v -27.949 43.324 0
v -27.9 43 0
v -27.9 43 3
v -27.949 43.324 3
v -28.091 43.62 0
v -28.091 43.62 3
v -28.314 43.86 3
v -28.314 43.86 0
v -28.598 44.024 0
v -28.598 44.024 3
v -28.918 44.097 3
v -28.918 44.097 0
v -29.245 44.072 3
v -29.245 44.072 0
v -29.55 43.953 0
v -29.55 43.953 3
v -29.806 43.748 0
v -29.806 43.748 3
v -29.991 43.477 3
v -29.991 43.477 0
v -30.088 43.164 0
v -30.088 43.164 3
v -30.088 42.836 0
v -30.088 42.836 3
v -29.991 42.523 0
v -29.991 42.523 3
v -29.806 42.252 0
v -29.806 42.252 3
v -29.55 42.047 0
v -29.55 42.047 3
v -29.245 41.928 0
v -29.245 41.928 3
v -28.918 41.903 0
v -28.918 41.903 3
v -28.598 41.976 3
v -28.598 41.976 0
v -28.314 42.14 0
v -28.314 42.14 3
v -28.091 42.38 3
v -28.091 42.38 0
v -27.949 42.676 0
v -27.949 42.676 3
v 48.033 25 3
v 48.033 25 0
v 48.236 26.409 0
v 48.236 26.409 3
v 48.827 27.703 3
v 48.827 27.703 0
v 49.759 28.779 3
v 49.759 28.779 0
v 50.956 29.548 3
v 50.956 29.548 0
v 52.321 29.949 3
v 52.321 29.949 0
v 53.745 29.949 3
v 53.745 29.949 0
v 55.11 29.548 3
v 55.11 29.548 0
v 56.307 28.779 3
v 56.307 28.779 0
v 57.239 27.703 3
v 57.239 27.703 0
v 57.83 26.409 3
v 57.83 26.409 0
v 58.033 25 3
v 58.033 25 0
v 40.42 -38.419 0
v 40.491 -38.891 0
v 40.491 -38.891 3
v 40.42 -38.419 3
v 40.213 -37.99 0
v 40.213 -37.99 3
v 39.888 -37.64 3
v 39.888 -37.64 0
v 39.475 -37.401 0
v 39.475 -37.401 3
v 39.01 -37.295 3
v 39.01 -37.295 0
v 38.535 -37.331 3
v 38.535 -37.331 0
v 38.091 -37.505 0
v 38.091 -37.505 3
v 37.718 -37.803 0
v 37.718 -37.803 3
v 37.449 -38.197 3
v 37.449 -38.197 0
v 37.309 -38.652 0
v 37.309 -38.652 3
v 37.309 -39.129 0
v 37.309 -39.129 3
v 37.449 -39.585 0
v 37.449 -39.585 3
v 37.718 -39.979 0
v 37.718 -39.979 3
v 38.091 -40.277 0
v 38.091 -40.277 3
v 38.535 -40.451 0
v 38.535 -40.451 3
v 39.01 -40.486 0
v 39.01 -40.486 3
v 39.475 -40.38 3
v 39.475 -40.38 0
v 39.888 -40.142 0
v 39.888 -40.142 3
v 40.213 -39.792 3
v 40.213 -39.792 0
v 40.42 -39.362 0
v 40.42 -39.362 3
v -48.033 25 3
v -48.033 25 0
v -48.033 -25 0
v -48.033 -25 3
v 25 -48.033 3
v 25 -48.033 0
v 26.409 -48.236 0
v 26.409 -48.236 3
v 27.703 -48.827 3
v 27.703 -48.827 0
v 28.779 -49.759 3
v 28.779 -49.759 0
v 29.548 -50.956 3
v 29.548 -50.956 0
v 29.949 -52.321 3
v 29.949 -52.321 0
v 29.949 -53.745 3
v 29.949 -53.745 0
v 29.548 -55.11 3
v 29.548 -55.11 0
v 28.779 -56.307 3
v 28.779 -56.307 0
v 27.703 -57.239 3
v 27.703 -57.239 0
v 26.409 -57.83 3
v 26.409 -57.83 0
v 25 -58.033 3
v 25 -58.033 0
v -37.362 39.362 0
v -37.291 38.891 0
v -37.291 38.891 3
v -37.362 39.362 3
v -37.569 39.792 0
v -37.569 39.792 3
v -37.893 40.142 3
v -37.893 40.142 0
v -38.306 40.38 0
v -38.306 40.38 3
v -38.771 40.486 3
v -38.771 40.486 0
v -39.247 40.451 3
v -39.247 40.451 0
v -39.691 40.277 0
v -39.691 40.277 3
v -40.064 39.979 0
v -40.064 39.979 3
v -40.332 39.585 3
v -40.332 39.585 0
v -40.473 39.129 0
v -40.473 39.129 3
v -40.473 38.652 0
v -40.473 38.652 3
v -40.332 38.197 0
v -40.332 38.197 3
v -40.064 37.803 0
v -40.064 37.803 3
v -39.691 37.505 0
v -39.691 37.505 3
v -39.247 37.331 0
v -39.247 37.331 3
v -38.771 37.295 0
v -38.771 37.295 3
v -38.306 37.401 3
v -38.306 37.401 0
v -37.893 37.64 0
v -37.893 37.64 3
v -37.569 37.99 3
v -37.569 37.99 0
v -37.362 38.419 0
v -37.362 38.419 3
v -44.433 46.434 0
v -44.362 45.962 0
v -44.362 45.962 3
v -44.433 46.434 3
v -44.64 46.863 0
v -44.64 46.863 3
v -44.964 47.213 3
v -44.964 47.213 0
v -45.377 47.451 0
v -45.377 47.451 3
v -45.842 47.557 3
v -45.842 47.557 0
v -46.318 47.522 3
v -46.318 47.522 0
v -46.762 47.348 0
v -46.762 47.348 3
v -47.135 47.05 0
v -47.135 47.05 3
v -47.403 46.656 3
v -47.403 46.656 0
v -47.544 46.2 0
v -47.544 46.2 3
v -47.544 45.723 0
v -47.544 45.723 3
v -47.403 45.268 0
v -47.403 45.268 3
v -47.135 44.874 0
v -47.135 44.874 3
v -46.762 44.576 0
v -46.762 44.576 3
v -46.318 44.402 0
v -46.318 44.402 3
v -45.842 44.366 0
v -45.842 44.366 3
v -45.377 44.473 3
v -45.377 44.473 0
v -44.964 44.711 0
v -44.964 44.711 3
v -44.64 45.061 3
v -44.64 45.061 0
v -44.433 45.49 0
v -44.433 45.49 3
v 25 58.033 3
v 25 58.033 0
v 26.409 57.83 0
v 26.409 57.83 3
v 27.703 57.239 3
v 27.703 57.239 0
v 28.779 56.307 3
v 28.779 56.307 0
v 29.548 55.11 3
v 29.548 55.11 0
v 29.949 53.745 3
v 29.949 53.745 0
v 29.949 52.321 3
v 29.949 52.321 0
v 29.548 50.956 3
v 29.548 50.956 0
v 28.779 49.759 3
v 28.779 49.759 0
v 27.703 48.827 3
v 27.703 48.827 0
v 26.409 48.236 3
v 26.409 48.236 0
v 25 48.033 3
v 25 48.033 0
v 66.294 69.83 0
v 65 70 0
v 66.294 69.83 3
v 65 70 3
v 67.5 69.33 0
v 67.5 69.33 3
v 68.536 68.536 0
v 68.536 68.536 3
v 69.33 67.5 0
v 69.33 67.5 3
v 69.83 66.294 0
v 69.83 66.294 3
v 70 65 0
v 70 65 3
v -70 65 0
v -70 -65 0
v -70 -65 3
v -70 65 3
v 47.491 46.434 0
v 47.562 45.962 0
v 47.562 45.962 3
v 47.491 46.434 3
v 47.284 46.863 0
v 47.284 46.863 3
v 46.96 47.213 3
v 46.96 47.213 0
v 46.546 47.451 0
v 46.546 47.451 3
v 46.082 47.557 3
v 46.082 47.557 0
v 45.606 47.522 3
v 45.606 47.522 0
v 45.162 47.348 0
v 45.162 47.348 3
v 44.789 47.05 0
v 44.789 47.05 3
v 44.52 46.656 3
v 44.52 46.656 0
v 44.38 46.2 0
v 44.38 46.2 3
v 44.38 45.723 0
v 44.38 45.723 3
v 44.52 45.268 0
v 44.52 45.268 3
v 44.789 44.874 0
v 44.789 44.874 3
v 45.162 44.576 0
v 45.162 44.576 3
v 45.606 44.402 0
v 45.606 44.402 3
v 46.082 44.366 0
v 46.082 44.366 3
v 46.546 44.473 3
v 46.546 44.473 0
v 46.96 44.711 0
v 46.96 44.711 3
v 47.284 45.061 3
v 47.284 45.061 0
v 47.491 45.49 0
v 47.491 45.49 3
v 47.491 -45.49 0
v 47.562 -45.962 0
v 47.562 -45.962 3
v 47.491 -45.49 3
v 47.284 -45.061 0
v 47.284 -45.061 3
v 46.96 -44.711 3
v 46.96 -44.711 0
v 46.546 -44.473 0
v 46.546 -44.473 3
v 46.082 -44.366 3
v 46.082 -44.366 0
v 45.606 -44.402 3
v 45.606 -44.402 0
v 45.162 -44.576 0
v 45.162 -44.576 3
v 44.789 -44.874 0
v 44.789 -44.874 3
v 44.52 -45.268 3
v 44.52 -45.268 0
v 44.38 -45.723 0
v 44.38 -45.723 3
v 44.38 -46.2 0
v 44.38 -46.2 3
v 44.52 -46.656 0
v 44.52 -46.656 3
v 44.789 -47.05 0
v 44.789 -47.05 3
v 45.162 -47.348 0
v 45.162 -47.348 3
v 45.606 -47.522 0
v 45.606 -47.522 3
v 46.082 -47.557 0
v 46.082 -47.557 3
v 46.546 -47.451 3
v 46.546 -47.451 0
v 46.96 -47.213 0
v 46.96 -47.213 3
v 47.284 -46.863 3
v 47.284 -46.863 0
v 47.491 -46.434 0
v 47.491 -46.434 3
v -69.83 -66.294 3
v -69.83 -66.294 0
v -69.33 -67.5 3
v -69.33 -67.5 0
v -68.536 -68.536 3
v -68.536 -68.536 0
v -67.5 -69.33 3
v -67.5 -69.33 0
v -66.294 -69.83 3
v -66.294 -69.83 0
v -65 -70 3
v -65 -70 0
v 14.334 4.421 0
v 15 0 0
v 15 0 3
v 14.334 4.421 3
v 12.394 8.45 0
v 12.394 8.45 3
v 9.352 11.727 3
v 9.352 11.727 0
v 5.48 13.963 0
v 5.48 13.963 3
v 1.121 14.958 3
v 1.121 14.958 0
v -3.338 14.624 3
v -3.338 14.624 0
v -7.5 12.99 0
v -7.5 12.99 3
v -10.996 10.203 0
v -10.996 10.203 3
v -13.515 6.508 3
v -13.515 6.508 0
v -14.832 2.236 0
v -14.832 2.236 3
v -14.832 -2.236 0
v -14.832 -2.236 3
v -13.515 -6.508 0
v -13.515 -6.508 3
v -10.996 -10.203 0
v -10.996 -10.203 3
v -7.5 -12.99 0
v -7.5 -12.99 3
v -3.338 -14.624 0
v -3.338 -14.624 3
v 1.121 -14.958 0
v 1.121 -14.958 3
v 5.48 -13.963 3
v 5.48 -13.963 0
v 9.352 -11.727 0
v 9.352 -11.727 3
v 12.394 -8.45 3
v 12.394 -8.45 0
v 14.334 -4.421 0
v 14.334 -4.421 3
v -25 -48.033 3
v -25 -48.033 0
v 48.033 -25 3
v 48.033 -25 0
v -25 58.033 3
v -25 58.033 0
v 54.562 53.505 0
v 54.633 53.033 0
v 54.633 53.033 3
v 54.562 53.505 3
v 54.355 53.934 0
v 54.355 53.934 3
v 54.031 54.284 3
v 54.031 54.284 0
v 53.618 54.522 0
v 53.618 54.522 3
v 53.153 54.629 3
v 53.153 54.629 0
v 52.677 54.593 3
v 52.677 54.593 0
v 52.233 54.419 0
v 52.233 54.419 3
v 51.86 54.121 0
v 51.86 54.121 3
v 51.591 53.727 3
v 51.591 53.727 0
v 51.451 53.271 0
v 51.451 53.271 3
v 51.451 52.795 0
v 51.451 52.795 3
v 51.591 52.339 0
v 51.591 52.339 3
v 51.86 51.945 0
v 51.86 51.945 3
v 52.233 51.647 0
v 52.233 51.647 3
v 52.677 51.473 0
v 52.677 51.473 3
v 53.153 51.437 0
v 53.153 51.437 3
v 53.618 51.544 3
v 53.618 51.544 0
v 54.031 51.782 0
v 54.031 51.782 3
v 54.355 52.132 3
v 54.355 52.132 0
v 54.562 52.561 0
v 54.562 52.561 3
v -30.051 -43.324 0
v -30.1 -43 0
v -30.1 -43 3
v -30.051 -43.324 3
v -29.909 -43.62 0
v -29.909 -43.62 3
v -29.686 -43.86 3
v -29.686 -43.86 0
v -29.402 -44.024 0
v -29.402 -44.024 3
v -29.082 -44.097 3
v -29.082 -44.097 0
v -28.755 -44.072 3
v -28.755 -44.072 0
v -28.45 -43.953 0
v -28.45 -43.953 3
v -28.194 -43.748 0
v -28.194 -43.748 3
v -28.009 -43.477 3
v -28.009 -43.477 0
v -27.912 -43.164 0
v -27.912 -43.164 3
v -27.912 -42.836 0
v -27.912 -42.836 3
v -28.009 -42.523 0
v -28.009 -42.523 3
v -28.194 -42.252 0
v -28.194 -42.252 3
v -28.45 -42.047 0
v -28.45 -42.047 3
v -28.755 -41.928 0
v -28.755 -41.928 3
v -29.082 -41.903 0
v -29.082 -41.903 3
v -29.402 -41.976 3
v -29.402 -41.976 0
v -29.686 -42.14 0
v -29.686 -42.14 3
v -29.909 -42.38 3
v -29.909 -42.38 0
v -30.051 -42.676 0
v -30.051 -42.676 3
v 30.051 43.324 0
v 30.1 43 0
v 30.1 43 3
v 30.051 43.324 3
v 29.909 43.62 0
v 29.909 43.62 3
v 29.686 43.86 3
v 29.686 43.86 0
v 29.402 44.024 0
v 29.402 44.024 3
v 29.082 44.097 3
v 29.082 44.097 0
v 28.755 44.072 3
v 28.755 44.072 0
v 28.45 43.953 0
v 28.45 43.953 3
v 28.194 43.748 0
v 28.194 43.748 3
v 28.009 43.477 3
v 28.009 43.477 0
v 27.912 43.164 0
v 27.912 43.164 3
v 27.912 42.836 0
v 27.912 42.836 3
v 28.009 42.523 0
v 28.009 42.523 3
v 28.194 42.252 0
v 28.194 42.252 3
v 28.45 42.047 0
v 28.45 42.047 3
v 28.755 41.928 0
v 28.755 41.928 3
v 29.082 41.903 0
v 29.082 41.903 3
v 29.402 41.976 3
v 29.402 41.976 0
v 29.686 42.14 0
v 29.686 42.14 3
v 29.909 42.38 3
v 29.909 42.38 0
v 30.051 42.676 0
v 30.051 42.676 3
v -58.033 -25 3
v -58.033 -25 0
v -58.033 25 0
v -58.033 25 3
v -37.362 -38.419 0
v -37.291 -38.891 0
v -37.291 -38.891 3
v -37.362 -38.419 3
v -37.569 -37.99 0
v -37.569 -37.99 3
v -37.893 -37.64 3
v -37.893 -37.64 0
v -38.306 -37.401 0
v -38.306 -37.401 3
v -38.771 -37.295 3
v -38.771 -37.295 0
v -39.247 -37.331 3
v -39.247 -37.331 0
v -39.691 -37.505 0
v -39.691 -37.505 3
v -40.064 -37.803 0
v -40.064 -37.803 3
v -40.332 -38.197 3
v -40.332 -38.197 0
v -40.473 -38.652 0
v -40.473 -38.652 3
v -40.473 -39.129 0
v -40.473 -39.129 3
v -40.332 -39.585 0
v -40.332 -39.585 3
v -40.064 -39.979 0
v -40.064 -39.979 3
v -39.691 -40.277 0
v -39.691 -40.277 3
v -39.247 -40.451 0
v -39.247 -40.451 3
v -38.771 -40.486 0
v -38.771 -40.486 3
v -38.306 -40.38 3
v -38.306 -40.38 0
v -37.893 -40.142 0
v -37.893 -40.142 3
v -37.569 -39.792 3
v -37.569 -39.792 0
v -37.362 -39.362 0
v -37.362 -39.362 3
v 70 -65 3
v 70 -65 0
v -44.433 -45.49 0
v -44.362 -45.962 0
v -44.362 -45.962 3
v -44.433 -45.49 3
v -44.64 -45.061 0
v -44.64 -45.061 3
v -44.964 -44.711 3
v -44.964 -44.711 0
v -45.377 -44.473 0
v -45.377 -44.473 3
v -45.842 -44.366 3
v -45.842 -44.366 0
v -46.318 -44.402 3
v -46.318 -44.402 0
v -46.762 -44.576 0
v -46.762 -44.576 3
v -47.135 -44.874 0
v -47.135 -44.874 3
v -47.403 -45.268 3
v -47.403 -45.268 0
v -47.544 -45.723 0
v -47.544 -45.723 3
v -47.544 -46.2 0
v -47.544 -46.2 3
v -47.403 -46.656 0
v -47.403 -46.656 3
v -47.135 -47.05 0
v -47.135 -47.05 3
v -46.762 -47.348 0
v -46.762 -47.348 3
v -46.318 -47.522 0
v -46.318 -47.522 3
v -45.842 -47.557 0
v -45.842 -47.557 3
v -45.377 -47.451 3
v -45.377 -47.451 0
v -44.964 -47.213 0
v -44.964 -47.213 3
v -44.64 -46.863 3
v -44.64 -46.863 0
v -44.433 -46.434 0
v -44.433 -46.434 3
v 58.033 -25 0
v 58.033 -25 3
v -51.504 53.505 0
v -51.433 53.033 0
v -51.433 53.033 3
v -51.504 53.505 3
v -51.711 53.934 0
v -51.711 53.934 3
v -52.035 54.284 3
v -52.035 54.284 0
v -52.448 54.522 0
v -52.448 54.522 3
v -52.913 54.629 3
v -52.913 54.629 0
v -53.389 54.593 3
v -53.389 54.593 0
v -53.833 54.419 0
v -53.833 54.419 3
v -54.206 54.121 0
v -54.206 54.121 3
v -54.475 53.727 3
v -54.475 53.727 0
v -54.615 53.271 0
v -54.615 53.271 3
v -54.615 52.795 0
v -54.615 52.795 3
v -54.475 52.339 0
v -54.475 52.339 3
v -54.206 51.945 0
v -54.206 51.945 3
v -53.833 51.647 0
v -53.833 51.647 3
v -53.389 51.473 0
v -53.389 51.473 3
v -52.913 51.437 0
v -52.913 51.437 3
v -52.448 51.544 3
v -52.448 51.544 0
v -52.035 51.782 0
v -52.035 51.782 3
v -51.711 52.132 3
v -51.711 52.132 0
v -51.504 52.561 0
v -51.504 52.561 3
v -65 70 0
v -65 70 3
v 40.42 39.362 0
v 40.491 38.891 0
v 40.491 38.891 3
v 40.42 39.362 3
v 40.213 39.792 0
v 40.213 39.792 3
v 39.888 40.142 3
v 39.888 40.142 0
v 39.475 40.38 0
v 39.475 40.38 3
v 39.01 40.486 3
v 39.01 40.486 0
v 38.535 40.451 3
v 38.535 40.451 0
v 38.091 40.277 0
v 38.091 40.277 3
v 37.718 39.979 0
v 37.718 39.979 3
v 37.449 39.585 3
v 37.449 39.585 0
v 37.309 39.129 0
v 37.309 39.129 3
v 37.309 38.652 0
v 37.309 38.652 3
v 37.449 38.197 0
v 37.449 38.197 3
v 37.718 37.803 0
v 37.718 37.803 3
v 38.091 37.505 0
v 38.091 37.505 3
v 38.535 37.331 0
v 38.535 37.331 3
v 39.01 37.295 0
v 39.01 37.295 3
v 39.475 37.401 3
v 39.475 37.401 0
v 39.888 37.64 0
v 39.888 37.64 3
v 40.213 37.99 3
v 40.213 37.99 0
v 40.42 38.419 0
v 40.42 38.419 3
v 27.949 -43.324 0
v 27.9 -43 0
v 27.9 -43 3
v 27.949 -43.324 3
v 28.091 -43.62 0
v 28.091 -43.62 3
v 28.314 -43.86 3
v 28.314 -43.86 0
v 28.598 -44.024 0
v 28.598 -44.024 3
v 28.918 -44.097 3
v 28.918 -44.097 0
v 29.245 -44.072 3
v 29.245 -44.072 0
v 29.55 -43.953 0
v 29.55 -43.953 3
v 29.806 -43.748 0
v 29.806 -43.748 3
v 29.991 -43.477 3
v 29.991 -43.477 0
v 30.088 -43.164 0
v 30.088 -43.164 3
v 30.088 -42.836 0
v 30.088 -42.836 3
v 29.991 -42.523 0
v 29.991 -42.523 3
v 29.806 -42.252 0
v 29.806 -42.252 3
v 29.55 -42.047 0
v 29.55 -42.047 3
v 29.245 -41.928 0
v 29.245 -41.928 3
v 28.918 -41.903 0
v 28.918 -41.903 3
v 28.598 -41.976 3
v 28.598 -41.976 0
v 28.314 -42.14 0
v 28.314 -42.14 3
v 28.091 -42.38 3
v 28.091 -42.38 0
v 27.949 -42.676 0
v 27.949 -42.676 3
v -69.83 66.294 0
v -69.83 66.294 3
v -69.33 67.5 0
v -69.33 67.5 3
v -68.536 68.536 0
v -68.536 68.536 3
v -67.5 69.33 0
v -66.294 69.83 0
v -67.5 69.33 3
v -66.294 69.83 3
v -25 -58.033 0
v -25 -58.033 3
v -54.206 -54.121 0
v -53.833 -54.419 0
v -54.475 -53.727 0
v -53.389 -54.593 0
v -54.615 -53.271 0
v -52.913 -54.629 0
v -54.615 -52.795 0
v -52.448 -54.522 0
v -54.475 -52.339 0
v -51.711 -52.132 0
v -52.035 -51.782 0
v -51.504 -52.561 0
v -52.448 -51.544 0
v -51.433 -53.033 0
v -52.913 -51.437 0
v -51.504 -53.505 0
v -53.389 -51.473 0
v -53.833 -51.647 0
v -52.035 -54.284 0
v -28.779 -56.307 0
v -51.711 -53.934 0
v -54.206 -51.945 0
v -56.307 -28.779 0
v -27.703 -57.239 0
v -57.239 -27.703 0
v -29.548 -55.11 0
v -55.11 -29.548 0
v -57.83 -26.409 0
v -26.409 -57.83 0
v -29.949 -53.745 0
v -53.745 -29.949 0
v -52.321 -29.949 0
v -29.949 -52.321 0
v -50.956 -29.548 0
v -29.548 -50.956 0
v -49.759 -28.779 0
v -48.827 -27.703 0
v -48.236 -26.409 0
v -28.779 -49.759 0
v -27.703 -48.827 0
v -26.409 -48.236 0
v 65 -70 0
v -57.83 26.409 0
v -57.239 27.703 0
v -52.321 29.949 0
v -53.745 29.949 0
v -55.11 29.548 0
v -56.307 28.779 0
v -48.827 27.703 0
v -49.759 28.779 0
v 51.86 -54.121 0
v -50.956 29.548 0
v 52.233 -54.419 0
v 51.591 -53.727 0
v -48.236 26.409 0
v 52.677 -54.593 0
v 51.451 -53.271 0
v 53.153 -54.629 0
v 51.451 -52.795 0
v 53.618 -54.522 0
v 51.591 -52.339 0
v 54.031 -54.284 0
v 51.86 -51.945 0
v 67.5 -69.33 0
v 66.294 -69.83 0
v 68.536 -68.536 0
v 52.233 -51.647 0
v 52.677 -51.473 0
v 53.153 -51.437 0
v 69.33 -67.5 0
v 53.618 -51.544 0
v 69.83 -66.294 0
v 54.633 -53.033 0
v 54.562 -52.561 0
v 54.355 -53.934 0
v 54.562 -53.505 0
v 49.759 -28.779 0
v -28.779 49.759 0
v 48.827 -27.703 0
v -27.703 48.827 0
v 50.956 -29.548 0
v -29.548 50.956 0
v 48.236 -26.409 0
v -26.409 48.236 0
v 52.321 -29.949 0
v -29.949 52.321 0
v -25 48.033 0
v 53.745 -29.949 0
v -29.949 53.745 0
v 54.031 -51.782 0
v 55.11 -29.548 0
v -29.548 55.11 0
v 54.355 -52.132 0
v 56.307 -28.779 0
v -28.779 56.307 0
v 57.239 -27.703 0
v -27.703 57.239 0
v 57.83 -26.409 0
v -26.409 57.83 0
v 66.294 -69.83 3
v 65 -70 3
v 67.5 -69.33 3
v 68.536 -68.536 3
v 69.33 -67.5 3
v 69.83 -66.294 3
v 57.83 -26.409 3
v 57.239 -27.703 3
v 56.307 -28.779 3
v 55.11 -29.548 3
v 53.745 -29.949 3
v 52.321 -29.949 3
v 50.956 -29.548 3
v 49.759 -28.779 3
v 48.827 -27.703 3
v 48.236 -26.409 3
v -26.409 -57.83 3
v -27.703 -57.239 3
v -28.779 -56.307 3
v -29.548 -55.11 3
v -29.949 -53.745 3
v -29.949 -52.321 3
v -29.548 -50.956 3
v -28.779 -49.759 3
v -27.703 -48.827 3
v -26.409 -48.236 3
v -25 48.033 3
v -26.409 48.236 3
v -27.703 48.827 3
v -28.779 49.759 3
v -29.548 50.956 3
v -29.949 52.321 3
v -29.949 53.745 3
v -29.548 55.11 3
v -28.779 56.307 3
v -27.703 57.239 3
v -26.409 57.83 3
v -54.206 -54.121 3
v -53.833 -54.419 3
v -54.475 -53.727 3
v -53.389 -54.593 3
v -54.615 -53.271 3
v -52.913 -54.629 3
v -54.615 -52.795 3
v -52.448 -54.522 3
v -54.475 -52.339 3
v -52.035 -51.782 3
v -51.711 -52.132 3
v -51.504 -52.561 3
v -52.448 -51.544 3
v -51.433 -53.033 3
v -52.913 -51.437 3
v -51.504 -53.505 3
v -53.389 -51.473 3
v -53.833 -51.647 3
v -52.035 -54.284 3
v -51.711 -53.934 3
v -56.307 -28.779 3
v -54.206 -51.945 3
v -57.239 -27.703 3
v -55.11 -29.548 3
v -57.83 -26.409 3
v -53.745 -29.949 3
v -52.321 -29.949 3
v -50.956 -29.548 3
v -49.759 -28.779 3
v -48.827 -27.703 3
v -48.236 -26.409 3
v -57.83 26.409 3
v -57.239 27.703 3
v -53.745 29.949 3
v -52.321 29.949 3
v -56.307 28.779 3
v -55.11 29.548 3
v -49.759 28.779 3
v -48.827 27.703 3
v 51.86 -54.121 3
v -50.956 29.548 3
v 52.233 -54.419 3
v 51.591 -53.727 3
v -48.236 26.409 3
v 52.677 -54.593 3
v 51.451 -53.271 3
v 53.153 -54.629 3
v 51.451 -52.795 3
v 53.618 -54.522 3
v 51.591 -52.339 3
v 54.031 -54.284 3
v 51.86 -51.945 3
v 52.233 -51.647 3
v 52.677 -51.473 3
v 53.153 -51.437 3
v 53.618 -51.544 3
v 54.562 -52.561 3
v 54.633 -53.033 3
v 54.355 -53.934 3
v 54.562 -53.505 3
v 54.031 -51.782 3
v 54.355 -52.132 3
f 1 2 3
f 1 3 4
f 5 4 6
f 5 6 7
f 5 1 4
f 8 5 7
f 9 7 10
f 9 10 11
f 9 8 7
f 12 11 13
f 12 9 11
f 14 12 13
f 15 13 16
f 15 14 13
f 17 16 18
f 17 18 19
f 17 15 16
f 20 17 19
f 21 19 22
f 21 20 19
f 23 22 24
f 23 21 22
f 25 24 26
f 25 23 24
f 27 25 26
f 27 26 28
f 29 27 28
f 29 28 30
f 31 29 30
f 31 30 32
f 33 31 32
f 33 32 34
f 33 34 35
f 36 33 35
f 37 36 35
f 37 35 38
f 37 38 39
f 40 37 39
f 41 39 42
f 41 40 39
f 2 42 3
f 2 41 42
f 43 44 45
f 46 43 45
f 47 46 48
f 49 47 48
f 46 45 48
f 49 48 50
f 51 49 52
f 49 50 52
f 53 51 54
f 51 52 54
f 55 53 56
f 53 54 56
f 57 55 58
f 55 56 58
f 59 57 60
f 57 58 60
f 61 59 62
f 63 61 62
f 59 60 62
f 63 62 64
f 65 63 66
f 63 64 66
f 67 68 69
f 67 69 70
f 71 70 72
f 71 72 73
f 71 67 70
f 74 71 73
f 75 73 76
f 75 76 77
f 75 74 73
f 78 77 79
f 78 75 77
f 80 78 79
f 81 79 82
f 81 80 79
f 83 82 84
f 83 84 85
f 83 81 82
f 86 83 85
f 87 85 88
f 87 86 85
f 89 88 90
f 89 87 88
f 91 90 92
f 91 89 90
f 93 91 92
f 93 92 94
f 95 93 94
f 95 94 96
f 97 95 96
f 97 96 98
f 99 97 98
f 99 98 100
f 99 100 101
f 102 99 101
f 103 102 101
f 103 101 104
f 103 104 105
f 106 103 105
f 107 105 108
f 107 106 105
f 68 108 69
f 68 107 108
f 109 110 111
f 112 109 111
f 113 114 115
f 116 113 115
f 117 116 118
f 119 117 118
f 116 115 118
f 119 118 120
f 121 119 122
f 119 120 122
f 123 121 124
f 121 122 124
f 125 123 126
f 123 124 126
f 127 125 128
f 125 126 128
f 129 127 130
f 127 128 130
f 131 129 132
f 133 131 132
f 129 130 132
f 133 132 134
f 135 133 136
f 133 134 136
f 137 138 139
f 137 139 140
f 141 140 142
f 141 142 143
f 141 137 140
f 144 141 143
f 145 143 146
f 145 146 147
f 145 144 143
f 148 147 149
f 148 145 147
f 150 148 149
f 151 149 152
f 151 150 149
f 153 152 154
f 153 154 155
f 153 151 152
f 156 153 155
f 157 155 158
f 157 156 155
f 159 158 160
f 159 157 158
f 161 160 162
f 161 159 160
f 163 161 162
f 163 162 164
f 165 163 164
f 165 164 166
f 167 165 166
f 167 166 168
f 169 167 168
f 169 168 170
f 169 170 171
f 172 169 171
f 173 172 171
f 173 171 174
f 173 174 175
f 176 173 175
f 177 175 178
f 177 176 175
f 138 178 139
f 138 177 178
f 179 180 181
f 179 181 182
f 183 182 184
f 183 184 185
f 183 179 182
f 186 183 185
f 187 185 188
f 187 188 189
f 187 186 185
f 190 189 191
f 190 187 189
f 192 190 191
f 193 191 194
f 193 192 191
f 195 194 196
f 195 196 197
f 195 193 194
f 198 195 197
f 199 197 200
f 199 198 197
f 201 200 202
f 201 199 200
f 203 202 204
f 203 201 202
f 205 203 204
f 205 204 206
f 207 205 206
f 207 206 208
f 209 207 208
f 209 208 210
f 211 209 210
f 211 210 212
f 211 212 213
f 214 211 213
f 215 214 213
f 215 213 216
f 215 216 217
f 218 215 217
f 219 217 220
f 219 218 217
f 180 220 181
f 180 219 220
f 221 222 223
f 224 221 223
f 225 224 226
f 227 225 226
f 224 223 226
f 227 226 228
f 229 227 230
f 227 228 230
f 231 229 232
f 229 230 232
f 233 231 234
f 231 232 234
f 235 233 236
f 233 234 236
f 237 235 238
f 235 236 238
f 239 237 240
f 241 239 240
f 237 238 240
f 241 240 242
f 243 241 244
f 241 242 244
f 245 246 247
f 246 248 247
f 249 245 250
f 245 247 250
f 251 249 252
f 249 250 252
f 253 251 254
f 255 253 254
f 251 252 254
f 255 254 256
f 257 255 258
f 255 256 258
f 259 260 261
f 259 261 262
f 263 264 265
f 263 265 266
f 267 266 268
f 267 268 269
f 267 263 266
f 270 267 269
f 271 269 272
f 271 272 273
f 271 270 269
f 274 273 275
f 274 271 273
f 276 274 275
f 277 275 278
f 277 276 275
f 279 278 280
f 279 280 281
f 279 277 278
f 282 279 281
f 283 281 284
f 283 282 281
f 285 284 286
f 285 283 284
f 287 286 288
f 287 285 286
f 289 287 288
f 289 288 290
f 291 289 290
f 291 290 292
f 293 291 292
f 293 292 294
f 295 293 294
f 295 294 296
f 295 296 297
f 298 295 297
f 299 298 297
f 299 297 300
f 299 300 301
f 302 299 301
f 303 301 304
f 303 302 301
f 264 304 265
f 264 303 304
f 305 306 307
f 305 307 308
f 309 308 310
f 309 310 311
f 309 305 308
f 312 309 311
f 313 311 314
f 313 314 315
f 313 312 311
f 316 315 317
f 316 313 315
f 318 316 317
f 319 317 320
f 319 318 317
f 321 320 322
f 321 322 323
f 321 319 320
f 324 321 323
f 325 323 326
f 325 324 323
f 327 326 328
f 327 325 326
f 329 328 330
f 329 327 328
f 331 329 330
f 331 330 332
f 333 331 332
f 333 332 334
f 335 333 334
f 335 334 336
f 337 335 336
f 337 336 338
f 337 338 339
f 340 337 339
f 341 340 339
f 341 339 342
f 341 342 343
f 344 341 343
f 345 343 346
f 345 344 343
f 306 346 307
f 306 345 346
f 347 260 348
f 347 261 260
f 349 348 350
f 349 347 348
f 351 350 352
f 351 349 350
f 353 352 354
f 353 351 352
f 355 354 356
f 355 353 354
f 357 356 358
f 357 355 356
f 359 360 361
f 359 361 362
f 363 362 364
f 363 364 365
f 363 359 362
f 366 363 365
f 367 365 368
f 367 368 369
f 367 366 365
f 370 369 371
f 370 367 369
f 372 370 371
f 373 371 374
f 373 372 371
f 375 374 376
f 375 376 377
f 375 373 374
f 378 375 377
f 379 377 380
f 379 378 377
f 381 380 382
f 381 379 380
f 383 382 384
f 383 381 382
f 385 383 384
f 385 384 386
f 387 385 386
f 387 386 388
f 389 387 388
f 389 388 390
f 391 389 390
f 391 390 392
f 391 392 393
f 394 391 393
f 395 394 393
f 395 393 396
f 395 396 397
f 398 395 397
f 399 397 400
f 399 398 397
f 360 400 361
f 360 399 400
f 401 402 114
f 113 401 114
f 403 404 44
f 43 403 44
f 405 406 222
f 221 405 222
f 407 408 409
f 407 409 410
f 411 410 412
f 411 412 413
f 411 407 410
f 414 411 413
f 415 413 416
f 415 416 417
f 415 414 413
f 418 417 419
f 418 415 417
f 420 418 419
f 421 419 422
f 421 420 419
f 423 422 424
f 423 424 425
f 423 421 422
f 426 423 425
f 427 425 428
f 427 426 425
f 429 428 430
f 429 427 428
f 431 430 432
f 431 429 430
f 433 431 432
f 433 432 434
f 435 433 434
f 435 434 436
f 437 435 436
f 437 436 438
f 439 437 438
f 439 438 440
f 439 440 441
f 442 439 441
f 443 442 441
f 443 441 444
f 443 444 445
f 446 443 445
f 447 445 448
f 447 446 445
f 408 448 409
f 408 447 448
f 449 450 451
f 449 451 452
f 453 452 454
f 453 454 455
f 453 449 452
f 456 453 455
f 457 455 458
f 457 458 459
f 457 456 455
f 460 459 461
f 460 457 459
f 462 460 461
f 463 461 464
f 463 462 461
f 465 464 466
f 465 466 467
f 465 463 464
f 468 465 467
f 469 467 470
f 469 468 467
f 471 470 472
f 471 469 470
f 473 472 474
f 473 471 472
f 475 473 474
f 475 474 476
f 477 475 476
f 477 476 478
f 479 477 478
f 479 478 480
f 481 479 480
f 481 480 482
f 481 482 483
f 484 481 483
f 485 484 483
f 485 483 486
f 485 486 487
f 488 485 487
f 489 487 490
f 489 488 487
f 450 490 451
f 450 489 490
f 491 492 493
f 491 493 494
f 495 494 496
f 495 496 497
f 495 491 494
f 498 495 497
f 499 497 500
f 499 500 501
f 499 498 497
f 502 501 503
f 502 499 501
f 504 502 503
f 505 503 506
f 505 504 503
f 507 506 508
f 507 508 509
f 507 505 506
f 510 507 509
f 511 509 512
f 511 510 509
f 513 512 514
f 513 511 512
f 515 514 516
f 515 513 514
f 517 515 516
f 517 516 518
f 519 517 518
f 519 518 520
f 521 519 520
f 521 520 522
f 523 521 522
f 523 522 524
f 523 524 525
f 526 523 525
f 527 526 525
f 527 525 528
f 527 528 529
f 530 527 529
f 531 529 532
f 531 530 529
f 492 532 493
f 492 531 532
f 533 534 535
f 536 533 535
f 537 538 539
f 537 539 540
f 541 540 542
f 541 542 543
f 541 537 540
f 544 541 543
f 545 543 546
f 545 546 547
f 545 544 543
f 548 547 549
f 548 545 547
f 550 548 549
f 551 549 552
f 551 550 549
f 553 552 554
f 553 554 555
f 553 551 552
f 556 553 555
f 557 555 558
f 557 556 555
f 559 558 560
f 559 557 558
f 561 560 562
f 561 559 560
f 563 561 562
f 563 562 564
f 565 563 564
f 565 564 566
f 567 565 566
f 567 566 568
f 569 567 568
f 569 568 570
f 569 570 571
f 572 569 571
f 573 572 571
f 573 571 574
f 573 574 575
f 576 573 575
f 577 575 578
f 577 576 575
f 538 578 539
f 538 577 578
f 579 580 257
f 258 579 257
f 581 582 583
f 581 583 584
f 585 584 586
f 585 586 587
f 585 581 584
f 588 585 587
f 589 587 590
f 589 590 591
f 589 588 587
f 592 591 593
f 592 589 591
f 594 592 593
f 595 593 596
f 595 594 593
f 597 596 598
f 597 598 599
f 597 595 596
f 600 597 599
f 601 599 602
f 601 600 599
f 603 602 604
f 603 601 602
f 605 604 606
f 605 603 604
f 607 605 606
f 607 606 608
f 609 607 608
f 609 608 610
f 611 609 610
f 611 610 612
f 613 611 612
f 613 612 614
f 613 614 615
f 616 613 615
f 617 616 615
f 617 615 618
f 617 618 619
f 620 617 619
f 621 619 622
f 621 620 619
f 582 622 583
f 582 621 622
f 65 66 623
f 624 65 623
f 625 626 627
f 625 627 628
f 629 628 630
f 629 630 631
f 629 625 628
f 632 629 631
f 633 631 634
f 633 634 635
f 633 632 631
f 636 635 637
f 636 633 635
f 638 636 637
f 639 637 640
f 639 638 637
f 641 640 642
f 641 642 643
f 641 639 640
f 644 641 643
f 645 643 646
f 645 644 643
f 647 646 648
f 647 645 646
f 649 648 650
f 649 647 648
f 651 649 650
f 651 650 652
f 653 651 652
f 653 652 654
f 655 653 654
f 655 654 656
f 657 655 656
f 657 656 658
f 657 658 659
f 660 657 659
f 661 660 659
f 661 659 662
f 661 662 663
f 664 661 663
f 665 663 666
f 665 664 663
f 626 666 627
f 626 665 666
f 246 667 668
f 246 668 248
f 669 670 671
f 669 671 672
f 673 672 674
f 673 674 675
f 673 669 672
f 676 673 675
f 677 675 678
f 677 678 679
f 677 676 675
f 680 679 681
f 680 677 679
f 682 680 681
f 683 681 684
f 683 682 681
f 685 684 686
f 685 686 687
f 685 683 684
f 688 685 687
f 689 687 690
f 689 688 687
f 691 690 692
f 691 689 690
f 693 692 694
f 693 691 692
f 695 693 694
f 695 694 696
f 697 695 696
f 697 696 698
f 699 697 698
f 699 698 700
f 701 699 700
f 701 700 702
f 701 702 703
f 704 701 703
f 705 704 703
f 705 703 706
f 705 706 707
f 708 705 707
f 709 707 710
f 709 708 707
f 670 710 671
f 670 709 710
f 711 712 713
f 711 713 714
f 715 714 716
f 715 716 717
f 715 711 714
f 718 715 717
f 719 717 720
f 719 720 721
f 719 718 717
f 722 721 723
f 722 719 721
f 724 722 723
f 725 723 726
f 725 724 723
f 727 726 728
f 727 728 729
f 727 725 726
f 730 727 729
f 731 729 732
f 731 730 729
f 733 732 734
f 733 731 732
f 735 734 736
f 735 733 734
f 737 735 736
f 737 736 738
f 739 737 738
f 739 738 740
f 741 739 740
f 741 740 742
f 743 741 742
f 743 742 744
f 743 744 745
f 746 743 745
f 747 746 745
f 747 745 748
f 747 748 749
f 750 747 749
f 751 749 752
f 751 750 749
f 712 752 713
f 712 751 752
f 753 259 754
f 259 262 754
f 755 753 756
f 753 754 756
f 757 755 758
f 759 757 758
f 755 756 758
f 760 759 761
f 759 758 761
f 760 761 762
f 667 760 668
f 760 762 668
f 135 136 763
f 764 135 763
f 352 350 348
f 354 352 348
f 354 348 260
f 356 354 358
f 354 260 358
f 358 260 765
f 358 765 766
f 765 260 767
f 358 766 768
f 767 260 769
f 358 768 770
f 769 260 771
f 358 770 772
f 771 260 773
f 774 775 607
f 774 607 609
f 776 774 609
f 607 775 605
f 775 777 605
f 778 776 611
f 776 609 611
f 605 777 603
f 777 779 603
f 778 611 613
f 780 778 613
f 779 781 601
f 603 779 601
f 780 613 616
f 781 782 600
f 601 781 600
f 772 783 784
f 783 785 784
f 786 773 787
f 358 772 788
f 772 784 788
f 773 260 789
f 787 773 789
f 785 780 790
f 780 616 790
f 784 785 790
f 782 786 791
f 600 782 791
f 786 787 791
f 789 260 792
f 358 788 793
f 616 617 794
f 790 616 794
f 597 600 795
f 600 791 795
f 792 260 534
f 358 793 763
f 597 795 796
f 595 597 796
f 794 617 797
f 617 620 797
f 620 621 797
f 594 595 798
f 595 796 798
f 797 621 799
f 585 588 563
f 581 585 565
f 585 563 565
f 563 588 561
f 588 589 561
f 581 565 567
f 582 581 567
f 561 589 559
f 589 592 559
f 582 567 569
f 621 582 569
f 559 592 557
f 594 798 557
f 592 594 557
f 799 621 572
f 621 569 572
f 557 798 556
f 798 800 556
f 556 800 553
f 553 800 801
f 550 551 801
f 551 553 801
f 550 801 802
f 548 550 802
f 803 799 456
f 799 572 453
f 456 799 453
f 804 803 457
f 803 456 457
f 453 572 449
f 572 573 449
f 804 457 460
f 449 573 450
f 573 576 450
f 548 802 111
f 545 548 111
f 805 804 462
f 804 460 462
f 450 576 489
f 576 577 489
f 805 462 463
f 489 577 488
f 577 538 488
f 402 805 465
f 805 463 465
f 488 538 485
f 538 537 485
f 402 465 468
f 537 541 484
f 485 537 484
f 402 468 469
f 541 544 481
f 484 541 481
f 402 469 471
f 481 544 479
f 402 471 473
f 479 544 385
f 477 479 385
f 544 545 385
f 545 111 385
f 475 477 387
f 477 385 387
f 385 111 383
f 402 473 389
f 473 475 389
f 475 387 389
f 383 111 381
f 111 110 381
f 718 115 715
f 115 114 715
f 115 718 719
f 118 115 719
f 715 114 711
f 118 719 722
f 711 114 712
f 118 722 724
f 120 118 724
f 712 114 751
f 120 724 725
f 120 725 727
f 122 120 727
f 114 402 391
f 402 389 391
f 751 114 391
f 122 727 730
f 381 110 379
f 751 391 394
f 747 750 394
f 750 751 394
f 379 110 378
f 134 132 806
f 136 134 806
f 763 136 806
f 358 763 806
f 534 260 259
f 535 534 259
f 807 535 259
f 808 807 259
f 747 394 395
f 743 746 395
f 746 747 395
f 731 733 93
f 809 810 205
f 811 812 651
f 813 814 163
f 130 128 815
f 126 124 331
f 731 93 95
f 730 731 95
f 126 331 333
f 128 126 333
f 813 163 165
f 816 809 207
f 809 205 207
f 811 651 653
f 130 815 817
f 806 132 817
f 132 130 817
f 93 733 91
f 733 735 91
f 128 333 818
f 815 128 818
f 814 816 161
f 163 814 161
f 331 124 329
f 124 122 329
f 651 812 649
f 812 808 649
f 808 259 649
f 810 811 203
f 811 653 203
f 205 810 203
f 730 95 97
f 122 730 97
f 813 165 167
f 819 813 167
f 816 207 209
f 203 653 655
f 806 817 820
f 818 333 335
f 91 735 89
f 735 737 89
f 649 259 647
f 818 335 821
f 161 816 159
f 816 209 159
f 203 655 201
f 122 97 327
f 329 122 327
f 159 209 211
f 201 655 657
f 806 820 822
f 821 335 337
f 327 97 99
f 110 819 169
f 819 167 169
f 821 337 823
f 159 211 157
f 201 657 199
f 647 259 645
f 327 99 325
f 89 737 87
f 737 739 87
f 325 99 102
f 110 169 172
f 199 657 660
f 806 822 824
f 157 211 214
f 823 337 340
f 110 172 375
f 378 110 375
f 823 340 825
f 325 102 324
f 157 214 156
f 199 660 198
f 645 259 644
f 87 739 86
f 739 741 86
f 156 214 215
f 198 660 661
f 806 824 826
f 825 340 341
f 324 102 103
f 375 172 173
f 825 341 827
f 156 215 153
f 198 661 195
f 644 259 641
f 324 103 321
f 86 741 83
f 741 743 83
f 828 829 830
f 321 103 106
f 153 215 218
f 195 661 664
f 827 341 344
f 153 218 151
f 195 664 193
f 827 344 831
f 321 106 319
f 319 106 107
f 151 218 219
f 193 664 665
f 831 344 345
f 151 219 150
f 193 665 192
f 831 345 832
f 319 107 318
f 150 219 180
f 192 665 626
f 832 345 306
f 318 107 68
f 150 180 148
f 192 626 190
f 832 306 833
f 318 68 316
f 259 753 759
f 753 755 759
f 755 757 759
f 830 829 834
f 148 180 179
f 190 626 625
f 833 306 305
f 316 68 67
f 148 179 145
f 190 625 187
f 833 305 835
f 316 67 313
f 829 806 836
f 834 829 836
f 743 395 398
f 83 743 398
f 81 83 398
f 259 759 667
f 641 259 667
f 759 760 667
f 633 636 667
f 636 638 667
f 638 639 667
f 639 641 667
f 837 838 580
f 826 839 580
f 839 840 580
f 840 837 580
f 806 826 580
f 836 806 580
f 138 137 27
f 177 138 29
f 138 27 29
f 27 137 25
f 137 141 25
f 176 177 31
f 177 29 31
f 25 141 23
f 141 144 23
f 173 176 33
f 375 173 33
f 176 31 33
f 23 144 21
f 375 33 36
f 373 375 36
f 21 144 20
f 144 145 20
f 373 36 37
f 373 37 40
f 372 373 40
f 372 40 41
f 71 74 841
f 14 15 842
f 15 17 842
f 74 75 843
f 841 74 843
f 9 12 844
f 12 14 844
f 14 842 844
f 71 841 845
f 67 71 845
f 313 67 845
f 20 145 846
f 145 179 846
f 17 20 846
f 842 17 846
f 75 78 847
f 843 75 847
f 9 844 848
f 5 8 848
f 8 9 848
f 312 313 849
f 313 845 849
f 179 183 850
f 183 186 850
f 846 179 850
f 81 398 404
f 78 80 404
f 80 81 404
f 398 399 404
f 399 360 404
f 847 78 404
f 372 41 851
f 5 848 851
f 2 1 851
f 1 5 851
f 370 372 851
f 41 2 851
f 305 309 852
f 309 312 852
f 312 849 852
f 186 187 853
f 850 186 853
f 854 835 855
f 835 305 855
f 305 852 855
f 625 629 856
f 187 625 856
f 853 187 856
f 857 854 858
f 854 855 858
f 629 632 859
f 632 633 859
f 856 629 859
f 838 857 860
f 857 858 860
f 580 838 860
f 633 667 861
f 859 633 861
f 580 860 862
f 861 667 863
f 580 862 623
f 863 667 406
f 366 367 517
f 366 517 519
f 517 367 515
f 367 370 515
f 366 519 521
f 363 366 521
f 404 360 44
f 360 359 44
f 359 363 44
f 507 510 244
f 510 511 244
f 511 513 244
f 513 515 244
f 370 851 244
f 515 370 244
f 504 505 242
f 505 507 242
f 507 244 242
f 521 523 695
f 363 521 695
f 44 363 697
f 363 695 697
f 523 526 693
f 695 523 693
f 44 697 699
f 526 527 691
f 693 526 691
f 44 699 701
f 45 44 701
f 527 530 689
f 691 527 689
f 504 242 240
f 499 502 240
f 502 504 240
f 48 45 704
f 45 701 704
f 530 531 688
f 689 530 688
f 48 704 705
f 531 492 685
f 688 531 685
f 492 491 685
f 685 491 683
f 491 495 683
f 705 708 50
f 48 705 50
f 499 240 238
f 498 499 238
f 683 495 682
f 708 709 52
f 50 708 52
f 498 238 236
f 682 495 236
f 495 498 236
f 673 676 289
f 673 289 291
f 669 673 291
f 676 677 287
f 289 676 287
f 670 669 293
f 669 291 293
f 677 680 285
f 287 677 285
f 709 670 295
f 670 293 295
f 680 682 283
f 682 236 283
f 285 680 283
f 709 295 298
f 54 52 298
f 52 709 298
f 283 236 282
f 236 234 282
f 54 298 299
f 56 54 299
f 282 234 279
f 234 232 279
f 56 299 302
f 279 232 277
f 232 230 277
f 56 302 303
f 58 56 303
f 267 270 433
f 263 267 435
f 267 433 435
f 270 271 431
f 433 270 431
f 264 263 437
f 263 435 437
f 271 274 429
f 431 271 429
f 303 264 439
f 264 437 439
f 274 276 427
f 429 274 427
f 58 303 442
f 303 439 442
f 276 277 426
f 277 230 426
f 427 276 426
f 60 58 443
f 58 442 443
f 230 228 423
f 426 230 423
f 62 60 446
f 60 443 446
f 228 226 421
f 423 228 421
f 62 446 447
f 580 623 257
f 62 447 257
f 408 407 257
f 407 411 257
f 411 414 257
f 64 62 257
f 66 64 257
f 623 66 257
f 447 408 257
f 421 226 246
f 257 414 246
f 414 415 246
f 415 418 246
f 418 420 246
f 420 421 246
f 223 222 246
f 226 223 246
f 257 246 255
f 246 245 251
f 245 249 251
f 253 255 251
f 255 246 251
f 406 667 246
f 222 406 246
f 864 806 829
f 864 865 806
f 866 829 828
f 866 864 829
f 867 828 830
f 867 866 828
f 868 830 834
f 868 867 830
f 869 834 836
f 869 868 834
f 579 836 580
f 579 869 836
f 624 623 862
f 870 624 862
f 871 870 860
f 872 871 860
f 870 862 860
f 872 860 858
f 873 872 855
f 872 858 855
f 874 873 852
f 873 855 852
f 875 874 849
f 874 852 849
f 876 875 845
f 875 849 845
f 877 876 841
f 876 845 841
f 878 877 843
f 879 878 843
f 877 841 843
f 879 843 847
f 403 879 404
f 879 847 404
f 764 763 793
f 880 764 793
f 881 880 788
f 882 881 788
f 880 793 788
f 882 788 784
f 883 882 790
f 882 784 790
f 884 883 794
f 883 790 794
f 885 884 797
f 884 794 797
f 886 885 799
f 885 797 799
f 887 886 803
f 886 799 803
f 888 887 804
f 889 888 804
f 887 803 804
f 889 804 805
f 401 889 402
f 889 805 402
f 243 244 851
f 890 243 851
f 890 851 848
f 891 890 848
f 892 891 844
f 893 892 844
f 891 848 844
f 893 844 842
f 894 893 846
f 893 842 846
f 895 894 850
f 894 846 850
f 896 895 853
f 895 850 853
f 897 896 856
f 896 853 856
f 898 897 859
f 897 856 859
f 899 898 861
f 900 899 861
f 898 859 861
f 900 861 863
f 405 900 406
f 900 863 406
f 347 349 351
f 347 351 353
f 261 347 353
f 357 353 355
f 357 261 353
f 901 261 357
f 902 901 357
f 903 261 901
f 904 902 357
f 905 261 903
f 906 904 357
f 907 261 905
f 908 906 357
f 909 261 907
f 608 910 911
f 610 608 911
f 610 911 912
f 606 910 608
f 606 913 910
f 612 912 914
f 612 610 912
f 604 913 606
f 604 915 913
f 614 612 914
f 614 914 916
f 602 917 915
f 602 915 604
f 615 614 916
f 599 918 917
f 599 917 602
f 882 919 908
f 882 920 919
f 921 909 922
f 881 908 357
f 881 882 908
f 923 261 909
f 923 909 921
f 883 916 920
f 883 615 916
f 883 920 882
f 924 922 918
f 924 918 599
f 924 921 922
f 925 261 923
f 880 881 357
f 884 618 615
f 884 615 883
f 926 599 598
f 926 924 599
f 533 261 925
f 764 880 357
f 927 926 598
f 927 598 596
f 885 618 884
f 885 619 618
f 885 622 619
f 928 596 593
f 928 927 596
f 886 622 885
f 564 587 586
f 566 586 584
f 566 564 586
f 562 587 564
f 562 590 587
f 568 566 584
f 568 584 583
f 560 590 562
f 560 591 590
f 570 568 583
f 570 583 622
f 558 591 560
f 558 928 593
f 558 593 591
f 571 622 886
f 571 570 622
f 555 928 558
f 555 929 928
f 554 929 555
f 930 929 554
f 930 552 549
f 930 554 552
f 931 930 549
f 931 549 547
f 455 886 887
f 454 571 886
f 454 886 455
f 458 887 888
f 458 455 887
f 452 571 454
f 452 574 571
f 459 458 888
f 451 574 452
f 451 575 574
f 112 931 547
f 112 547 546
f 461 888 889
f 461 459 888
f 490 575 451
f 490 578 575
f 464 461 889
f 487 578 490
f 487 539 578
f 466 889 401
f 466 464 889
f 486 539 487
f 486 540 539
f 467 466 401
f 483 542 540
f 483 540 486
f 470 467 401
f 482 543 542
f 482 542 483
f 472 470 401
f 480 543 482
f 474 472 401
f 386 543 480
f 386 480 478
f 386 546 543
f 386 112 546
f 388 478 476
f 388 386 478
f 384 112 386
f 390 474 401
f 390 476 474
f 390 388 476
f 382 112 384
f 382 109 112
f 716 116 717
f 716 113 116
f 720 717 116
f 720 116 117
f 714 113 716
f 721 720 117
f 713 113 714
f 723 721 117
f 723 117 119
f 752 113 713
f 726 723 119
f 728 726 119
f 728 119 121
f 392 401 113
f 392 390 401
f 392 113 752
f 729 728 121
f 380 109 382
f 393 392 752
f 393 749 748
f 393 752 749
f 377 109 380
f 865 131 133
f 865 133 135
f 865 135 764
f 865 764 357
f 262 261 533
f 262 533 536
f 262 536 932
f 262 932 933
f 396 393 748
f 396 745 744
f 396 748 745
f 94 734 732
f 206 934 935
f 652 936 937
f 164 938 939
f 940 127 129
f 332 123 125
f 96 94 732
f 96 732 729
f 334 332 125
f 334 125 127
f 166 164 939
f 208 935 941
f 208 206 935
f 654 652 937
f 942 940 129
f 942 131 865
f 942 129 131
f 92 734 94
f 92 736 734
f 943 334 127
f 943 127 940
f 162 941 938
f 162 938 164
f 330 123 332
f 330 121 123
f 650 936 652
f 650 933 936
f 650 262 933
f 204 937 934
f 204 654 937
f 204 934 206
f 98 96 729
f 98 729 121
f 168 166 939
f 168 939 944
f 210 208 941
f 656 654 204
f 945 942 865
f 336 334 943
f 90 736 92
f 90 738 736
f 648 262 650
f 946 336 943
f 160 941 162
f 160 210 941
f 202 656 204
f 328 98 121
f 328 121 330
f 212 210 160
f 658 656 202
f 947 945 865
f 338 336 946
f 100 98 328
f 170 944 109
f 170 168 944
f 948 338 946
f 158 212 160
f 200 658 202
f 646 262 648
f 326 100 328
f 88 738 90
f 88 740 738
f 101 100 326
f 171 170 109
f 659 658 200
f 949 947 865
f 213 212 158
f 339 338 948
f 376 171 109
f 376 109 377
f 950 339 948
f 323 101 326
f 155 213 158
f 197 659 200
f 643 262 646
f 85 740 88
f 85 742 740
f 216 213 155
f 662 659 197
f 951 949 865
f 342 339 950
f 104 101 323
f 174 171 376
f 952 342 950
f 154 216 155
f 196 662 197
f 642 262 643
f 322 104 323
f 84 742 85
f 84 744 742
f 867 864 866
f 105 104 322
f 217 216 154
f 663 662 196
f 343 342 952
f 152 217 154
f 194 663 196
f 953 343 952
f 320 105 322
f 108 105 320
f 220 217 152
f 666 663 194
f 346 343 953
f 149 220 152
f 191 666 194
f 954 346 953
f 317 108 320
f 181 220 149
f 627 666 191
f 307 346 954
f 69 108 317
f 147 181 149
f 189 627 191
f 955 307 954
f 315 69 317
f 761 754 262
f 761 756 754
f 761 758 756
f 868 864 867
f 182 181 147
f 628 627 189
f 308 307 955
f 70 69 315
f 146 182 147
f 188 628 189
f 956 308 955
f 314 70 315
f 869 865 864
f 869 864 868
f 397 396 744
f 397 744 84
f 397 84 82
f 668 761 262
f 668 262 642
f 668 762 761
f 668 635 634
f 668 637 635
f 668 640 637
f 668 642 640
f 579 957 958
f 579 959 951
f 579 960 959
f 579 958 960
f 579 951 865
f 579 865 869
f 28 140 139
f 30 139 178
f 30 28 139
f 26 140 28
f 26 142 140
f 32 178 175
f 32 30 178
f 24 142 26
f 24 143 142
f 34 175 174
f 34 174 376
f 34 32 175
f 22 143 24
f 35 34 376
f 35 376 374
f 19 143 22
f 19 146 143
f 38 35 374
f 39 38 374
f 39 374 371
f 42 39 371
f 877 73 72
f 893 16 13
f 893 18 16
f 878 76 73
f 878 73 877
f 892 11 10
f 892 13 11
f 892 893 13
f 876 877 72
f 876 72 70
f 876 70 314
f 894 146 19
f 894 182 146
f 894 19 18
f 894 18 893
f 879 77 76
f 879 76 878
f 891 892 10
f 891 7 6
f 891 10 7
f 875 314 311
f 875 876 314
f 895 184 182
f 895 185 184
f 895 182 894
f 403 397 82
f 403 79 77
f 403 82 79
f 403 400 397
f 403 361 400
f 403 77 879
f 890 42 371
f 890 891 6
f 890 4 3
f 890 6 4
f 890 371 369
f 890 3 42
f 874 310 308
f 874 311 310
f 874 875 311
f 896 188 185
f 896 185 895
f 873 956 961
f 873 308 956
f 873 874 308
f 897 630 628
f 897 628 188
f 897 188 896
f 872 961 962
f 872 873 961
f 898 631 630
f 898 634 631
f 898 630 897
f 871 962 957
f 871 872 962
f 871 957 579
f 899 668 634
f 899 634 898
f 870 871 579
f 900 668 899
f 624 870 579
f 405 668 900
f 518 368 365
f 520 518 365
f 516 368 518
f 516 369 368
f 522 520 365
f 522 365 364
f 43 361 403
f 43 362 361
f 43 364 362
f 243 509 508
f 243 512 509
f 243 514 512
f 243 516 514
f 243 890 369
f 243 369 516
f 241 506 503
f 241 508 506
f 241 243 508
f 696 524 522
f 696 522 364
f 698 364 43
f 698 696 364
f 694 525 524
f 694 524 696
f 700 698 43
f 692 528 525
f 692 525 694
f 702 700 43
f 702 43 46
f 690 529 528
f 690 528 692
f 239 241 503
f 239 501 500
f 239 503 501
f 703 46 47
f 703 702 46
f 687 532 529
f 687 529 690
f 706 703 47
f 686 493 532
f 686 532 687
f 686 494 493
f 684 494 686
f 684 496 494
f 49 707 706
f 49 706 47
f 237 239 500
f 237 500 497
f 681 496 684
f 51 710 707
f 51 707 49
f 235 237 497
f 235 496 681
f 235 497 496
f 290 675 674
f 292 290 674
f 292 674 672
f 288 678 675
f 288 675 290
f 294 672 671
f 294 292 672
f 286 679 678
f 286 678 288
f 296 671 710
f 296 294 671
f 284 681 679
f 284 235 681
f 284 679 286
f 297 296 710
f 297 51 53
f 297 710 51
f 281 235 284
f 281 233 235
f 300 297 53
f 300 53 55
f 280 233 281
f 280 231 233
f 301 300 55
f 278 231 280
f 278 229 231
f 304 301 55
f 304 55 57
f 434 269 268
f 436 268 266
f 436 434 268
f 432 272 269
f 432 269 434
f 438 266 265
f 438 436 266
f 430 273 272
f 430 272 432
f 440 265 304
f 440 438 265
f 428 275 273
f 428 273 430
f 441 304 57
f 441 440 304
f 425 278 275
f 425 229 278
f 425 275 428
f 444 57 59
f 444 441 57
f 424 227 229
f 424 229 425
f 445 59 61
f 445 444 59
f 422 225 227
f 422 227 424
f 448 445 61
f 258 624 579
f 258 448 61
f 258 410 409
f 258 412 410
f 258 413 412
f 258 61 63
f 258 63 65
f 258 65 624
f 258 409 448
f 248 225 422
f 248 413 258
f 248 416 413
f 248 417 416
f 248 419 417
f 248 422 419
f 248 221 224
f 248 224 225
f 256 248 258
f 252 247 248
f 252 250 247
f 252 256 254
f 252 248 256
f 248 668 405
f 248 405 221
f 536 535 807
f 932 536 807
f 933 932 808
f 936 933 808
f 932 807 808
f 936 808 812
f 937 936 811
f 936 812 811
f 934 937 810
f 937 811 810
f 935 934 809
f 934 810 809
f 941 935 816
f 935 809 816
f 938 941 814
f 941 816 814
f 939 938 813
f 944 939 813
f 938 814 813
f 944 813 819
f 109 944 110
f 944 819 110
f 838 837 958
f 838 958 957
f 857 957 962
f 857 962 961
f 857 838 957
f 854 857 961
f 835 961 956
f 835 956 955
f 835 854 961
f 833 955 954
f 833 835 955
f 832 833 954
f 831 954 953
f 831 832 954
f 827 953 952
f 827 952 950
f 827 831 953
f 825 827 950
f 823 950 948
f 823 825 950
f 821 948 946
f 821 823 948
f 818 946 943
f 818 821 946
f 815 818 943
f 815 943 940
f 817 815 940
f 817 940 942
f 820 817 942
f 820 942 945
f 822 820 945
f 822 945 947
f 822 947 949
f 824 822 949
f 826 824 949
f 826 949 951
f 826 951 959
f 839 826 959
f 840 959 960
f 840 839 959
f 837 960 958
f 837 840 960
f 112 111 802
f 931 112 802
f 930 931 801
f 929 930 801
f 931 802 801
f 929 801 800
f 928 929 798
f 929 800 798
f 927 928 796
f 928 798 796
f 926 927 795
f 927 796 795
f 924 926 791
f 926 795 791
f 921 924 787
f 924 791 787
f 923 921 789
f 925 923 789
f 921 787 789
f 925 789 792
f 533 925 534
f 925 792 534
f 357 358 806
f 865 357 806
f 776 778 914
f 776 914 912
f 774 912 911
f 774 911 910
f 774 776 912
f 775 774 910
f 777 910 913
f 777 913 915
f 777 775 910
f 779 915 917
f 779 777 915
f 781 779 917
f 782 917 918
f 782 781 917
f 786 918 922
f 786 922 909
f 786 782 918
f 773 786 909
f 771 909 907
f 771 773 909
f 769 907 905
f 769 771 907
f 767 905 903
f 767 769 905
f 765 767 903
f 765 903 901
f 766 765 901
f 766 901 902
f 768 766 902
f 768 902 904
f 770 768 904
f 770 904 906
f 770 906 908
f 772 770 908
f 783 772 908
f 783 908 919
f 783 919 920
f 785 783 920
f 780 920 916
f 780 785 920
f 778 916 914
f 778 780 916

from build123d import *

# Parameters (mm, degrees)
SKETCH_1_W      = 140
SKETCH_1_H      = 140
SKETCH_1_R      = 1.6
SKETCH_1_R_2    = 1.1
SKETCH_1_R_3    = 15
EXTRUDE_1_DEPTH = 3
FILLET_1_R      = 5


with BuildPart() as part:
    # 草图1 → 凸台-拉伸1 (new body)
    with BuildSketch(Plane.XY):
        Rectangle(SKETCH_1_W, SKETCH_1_H)
        with Locations((53.033008589, 53.033008589)):
            Circle(SKETCH_1_R, mode=Mode.SUBTRACT)
        with Locations((-29, 43)):
            Circle(SKETCH_1_R_2, mode=Mode.SUBTRACT)
        with Locations((29, 43)):
            Circle(SKETCH_1_R_2, mode=Mode.SUBTRACT)
        with Locations(Location((29, -43, 0), (0, 0, 180))):
            Circle(SKETCH_1_R_2, mode=Mode.SUBTRACT)
        with Locations(Location((-29, -43, 0), (0, 0, 180))):
            Circle(SKETCH_1_R_2, mode=Mode.SUBTRACT)
        with Locations((53.033008589, -53.033008589)):
            Circle(SKETCH_1_R, mode=Mode.SUBTRACT)
        with Locations((-53.033008589, -53.033008589)):
            Circle(SKETCH_1_R, mode=Mode.SUBTRACT)
        with Locations((-53.033008589, 53.033008589)):
            Circle(SKETCH_1_R, mode=Mode.SUBTRACT)
        with Locations((45.961940777, 45.961940777)):
            Circle(SKETCH_1_R, mode=Mode.SUBTRACT)
        with Locations((38.890872965, 38.890872965)):
            Circle(SKETCH_1_R, mode=Mode.SUBTRACT)
        with Locations((45.961940777, -45.961940777)):
            Circle(SKETCH_1_R, mode=Mode.SUBTRACT)
        with Locations((38.890872965, -38.890872965)):
            Circle(SKETCH_1_R, mode=Mode.SUBTRACT)
        with Locations((-45.961940777, -45.961940777)):
            Circle(SKETCH_1_R, mode=Mode.SUBTRACT)
        with Locations((-38.890872965, -38.890872965)):
            Circle(SKETCH_1_R, mode=Mode.SUBTRACT)
        with Locations((-45.961940777, 45.961940777)):
            Circle(SKETCH_1_R, mode=Mode.SUBTRACT)
        with Locations((-38.890872965, 38.890872965)):
            Circle(SKETCH_1_R, mode=Mode.SUBTRACT)
        Circle(SKETCH_1_R_3, mode=Mode.SUBTRACT)
        with BuildLine():
            Line((-25, 58.033008589), (25, 58.033008589))
            ThreePointArc((25, 58.033008589), (30, 53.033008589), (25, 48.033008589))
            Line((25, 48.033008589), (-25, 48.033008589))
            ThreePointArc((-25, 48.033008589), (-30, 53.033008589), (-25, 58.033008589))
        make_face(mode=Mode.SUBTRACT)
        with BuildLine():
            Line((58.033008589, 25), (58.033008589, -25))
            ThreePointArc((58.033008589, -25), (53.033008589, -30), (48.033008589, -25))
            Line((48.033008589, -25), (48.033008589, 25))
            ThreePointArc((48.033008589, 25), (53.033008589, 30), (58.033008589, 25))
        make_face(mode=Mode.SUBTRACT)
        with BuildLine():
            Line((25, -58.033008589), (-25, -58.033008589))
            ThreePointArc((-25, -58.033008589), (-30, -53.033008589), (-25, -48.033008589))
            Line((-25, -48.033008589), (25, -48.033008589))
            ThreePointArc((25, -48.033008589), (30, -53.033008589), (25, -58.033008589))
        make_face(mode=Mode.SUBTRACT)
        with BuildLine():
            Line((-58.033008589, -25), (-58.033008589, 25))
            ThreePointArc((-58.033008589, 25), (-53.033008589, 30), (-48.033008589, 25))
            Line((-48.033008589, 25), (-48.033008589, -25))
            ThreePointArc((-48.033008589, -25), (-53.033008589, -30), (-58.033008589, -25))
        make_face(mode=Mode.SUBTRACT)
    extrude(amount=EXTRUDE_1_DEPTH)

    # 圆角1
    fillet_1_edges = [part.edges().sort_by_distance(p)[0] for p in [
        (-70, 70, 1.5),
        (70, 70, 1.5),
        (70, -70, 1.5),
        (-70, -70, 1.5),
    ]]
    fillet(fillet_1_edges, radius=FILLET_1_R)


solid = part.part
